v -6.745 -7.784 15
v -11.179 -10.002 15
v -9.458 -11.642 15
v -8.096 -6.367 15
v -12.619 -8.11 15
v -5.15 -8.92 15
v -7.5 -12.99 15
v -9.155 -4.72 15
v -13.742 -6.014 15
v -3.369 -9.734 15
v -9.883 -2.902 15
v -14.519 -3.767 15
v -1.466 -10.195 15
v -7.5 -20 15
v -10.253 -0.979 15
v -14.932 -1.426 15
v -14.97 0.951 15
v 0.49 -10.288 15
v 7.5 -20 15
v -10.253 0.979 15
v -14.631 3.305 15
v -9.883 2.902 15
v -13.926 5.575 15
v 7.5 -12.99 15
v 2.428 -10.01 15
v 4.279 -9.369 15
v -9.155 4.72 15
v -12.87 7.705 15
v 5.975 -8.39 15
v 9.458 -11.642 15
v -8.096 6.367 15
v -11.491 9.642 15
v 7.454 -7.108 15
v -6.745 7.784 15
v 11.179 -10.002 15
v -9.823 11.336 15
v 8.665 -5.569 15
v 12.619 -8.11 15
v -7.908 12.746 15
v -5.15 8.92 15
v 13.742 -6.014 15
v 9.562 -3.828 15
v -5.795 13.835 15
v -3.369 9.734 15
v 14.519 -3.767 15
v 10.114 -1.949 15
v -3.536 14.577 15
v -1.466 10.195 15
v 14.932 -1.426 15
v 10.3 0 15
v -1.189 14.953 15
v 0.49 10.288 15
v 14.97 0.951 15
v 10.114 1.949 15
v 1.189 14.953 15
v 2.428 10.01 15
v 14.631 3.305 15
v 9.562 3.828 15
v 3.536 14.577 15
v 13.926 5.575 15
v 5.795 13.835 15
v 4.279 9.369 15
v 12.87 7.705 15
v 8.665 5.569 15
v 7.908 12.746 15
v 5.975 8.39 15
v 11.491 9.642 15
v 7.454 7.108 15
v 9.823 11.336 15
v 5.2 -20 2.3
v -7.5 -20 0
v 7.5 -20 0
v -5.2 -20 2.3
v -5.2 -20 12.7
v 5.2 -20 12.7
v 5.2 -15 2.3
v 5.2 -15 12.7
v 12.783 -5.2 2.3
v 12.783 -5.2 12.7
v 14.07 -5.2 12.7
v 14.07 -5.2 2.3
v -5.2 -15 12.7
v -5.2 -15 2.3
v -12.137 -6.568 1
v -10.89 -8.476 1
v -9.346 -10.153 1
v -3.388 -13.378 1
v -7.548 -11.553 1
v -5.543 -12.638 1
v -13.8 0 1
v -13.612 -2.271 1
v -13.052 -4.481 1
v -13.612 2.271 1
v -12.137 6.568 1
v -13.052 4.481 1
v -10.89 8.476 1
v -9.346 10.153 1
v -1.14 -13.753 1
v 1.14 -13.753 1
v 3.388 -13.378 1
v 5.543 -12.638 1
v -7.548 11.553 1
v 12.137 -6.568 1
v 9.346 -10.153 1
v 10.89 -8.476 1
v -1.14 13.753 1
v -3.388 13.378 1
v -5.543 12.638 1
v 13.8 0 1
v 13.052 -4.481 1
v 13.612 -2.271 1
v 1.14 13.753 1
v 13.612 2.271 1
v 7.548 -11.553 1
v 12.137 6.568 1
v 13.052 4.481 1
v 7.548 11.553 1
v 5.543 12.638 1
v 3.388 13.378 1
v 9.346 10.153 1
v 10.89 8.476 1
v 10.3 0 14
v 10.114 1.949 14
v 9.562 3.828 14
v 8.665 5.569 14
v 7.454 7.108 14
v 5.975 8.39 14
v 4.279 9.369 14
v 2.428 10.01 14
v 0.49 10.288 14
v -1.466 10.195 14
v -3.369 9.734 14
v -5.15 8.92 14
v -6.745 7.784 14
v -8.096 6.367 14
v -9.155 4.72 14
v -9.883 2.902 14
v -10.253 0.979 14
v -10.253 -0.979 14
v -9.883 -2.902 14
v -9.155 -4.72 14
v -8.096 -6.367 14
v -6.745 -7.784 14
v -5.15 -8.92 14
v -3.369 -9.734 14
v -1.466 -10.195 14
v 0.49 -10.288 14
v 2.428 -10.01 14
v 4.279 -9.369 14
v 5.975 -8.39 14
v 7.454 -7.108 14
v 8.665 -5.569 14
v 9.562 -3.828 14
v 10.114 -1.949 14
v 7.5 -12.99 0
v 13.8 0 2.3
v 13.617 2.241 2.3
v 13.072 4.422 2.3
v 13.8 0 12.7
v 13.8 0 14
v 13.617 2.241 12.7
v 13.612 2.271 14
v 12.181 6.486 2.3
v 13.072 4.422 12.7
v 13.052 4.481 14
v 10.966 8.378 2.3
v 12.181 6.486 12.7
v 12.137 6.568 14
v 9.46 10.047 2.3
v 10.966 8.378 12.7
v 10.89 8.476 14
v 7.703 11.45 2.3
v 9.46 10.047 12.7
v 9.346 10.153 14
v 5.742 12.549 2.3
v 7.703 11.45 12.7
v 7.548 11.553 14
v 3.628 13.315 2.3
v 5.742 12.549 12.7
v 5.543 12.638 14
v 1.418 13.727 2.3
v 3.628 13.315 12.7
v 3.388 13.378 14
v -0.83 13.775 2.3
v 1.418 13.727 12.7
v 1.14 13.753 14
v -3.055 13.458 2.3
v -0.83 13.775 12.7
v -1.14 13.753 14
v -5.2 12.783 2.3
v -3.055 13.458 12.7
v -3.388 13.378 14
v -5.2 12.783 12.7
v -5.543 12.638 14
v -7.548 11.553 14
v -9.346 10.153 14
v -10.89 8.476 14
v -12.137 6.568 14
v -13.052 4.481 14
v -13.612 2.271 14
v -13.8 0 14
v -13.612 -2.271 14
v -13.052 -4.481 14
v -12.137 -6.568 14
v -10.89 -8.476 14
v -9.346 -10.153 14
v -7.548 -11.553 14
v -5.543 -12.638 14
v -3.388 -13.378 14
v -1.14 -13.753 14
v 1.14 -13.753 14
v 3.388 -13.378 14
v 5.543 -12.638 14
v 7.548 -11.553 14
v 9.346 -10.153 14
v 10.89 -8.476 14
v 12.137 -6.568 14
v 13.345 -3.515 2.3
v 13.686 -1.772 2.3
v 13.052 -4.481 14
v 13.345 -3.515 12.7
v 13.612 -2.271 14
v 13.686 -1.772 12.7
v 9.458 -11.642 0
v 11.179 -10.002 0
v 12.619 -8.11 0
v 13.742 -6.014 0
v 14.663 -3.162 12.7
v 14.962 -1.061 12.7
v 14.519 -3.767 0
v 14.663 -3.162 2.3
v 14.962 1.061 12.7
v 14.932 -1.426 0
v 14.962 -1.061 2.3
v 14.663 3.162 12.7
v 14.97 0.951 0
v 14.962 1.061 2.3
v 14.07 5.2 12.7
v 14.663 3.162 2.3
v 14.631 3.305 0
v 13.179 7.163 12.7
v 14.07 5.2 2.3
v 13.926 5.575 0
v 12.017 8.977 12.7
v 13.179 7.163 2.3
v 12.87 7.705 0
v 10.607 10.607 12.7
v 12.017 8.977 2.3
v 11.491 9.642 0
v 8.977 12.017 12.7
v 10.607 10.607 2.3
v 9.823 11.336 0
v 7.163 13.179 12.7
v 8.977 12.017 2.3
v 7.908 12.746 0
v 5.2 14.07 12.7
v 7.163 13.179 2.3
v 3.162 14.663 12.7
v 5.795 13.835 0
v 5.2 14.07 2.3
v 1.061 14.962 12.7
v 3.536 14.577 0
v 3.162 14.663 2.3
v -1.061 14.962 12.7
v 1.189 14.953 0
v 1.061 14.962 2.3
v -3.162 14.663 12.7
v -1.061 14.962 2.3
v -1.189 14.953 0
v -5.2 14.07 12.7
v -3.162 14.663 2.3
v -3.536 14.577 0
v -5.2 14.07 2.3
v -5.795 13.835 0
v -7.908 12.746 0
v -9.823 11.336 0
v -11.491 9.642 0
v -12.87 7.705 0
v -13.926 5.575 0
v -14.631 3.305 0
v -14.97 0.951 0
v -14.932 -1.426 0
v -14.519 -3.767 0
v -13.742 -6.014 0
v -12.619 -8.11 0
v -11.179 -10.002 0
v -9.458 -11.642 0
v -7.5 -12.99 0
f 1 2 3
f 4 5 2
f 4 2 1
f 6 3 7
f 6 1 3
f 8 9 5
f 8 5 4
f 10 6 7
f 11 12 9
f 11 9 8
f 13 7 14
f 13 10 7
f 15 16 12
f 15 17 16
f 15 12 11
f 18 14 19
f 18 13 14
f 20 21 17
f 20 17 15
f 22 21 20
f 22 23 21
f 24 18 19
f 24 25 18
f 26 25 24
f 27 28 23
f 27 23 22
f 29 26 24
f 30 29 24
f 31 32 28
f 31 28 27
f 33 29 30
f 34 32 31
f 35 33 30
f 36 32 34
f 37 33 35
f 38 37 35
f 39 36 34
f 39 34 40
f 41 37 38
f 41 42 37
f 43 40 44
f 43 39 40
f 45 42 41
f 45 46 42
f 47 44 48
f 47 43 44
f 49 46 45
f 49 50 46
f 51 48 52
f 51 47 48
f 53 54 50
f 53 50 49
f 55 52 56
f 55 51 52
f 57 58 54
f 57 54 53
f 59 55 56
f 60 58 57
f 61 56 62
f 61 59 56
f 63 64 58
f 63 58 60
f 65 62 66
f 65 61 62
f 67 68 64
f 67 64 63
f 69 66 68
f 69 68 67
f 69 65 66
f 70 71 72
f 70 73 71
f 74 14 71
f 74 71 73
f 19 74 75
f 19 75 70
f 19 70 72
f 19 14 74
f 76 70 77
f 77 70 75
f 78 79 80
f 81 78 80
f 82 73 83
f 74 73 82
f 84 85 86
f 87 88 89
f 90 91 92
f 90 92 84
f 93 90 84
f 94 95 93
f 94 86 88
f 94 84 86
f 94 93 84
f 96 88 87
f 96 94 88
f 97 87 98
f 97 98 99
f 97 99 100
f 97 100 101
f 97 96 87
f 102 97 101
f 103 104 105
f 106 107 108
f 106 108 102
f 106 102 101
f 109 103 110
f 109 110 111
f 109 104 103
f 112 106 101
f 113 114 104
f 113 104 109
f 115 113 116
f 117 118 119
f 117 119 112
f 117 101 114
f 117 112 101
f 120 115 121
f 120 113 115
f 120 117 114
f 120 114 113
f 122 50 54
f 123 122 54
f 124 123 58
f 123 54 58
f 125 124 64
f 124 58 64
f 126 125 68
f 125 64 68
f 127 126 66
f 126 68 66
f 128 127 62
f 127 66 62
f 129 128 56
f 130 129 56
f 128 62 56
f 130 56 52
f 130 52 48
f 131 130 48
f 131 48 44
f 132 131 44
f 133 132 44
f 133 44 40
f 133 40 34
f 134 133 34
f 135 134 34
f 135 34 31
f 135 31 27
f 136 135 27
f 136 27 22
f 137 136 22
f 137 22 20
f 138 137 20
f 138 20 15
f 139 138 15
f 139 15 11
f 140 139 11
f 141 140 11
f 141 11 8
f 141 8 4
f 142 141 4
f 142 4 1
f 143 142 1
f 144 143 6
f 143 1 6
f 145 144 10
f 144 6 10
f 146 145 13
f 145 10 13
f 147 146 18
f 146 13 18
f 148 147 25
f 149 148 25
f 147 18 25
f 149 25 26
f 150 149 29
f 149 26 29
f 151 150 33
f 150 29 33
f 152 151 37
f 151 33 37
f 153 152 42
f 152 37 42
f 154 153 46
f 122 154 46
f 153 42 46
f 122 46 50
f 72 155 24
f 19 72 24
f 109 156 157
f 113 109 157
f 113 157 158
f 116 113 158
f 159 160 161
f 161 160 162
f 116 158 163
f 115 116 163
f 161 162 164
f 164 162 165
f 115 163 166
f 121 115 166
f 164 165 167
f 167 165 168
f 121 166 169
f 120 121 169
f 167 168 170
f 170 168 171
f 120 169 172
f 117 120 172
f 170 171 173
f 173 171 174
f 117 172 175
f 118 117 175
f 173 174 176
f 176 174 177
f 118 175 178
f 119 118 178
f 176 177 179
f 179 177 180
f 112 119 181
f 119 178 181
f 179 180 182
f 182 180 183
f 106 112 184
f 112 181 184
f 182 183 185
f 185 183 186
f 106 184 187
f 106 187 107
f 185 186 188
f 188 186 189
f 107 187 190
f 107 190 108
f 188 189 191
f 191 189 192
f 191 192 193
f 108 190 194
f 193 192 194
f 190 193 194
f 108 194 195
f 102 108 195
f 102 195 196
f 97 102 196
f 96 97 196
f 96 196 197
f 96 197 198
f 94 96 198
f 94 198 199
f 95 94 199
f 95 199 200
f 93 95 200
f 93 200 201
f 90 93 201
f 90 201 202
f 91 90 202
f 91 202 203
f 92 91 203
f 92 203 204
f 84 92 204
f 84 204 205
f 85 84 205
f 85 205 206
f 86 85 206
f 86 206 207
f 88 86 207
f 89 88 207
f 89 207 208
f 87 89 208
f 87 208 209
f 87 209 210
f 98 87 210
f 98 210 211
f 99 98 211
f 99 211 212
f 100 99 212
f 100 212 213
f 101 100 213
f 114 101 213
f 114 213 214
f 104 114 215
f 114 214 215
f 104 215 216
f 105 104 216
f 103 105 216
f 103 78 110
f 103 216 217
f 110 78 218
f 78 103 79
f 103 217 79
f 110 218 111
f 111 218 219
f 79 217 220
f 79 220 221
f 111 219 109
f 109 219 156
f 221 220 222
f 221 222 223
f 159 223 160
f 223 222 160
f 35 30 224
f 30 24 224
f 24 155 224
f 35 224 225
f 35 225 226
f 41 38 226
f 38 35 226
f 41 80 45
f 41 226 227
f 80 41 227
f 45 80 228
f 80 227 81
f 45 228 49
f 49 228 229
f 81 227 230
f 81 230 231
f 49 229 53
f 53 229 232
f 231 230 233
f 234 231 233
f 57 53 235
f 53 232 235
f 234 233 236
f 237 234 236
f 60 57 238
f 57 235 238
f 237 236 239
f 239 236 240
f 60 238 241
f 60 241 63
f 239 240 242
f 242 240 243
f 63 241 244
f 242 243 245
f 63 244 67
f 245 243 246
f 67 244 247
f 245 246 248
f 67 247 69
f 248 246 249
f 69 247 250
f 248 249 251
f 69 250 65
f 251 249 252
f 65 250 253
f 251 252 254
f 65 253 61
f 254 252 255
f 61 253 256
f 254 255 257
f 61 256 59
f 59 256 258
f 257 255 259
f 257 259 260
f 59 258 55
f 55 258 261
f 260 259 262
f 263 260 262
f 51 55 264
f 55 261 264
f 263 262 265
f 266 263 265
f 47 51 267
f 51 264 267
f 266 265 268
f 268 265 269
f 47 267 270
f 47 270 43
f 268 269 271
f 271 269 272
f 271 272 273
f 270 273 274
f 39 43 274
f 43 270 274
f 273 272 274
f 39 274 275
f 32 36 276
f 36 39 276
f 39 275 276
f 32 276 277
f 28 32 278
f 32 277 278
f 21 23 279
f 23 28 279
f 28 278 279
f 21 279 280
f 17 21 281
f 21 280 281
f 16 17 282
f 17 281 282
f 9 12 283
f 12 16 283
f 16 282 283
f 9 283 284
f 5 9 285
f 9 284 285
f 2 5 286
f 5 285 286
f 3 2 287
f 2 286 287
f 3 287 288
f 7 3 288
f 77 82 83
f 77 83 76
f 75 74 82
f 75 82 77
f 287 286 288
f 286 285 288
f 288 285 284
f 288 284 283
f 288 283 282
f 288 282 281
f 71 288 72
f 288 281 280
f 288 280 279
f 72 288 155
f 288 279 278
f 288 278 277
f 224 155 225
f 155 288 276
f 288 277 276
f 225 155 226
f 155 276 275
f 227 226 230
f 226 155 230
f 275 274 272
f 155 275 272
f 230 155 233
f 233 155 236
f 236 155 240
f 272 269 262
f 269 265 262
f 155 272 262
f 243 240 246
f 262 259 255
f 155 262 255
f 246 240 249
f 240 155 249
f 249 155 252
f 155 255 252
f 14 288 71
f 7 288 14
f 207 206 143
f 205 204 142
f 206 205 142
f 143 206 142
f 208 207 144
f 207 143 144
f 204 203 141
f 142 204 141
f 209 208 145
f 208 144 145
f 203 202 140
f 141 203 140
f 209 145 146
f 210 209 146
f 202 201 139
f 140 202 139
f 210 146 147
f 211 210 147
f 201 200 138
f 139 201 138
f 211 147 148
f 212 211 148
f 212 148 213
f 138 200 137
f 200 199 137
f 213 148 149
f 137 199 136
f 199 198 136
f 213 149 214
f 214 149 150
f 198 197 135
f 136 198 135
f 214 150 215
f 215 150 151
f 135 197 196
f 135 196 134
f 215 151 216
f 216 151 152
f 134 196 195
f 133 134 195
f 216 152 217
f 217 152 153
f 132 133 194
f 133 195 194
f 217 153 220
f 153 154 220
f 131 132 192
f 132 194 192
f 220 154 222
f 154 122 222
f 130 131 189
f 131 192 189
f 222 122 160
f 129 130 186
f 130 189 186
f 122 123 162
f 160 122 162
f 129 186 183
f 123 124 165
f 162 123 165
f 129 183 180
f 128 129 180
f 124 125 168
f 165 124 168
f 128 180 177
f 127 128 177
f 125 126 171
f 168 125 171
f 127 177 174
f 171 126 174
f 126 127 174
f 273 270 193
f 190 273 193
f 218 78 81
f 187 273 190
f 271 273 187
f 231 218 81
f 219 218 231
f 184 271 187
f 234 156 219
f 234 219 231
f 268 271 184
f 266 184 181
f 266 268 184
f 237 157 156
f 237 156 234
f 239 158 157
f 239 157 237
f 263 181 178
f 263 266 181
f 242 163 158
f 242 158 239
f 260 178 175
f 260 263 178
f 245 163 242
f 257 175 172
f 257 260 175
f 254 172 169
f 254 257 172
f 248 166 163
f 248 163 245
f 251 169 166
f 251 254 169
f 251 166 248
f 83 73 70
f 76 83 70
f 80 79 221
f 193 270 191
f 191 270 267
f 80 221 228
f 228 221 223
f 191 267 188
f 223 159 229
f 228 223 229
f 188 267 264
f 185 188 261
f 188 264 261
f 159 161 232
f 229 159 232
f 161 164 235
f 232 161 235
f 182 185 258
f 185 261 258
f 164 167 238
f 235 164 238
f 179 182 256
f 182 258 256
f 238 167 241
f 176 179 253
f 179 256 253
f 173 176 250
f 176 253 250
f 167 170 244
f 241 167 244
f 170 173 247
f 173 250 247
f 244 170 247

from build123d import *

# Parameters (mm, degrees)
F0_R      = 15
F1_DEPTH  = 15
F2_W      = 15
F2_H      = 15
F3_DEPTH  = 20
F4_W      = 10.4
F4_H      = 10.4
F5_DEPTH  = 5
F7_START  = -1
F6_R      = 13.8
F7_DEPTH  = 13
F8_R      = 10.3
F9_DEPTH  = 2
F11_START = -2.3
F11_DEPTH = 10.4


with BuildPart() as f1:
    # F0 (on Top) → F1 (new body)
    with BuildSketch(Plane.XY):
        Circle(F0_R)
    extrude(amount=F1_DEPTH)

    # F2 (on Front) → F3 (join)
    with BuildSketch(Plane.XZ):
        with Locations((0, 7.5)):
            Rectangle(F2_W, F2_H)
    extrude(amount=F3_DEPTH)

    # F4 (on face) → F5 (cut)
    with BuildSketch(Plane.XZ.offset(20)):
        with Locations((0, 7.5)):
            Rectangle(F4_W, F4_H)
    extrude(amount=-F5_DEPTH, mode=Mode.SUBTRACT)

    # F6 (on face) → F7 (cut)
    with BuildSketch(Plane.XY.offset(15).offset(F7_START)):
        Circle(F6_R)
    extrude(amount=-F7_DEPTH, mode=Mode.SUBTRACT)

    # F8 (on face) → F9 (cut)
    with BuildSketch(Plane.XY.offset(15)):
        Circle(F8_R)
    extrude(amount=-F9_DEPTH, mode=Mode.SUBTRACT)

    # F10 (on face) → F11 (cut)
    with BuildSketch(Plane.XY.offset(15).offset(F11_START)):
        with BuildLine():
            Line((5.2, 8.8910066922), (5.2, 14.0698258696))
            ThreePointArc((5.2, 14.0698258696), (0, 15), (-5.2, 14.0698258696))
            Line((-5.2, 14.0698258696), (-5.2, 8.8910066922))
            ThreePointArc((-5.2, 8.8910066922), (0, 10.3), (5.2, 8.8910066922))
        make_face()
        with BuildLine():
            Line((8.8910066922, 5.2), (14.0698258696, 5.2))
            ThreePointArc((14.0698258696, 5.2), (10.6066017178, 10.6066017178), (5.2, 14.0698258696))
            Line((5.2, 14.0698258696), (5.2, 8.8910066922))
            ThreePointArc((5.2, 8.8910066922), (7.2831998462, 7.2831998462), (8.8910066922, 5.2))
        make_face()
        with BuildLine():
            Line((8.8910066922, -5.2), (14.0698258696, -5.2))
            ThreePointArc((14.0698258696, -5.2), (15, 0), (14.0698258696, 5.2))
            Line((14.0698258696, 5.2), (8.8910066922, 5.2))
            ThreePointArc((8.8910066922, 5.2), (9.9415131879, 2.6937549138), (10.3, 0))
            ThreePointArc((10.3, 0), (9.9415131879, -2.6937549138), (8.8910066922, -5.2))
        make_face()
    extrude(amount=-F11_DEPTH, mode=Mode.SUBTRACT)


solid = f1.part
